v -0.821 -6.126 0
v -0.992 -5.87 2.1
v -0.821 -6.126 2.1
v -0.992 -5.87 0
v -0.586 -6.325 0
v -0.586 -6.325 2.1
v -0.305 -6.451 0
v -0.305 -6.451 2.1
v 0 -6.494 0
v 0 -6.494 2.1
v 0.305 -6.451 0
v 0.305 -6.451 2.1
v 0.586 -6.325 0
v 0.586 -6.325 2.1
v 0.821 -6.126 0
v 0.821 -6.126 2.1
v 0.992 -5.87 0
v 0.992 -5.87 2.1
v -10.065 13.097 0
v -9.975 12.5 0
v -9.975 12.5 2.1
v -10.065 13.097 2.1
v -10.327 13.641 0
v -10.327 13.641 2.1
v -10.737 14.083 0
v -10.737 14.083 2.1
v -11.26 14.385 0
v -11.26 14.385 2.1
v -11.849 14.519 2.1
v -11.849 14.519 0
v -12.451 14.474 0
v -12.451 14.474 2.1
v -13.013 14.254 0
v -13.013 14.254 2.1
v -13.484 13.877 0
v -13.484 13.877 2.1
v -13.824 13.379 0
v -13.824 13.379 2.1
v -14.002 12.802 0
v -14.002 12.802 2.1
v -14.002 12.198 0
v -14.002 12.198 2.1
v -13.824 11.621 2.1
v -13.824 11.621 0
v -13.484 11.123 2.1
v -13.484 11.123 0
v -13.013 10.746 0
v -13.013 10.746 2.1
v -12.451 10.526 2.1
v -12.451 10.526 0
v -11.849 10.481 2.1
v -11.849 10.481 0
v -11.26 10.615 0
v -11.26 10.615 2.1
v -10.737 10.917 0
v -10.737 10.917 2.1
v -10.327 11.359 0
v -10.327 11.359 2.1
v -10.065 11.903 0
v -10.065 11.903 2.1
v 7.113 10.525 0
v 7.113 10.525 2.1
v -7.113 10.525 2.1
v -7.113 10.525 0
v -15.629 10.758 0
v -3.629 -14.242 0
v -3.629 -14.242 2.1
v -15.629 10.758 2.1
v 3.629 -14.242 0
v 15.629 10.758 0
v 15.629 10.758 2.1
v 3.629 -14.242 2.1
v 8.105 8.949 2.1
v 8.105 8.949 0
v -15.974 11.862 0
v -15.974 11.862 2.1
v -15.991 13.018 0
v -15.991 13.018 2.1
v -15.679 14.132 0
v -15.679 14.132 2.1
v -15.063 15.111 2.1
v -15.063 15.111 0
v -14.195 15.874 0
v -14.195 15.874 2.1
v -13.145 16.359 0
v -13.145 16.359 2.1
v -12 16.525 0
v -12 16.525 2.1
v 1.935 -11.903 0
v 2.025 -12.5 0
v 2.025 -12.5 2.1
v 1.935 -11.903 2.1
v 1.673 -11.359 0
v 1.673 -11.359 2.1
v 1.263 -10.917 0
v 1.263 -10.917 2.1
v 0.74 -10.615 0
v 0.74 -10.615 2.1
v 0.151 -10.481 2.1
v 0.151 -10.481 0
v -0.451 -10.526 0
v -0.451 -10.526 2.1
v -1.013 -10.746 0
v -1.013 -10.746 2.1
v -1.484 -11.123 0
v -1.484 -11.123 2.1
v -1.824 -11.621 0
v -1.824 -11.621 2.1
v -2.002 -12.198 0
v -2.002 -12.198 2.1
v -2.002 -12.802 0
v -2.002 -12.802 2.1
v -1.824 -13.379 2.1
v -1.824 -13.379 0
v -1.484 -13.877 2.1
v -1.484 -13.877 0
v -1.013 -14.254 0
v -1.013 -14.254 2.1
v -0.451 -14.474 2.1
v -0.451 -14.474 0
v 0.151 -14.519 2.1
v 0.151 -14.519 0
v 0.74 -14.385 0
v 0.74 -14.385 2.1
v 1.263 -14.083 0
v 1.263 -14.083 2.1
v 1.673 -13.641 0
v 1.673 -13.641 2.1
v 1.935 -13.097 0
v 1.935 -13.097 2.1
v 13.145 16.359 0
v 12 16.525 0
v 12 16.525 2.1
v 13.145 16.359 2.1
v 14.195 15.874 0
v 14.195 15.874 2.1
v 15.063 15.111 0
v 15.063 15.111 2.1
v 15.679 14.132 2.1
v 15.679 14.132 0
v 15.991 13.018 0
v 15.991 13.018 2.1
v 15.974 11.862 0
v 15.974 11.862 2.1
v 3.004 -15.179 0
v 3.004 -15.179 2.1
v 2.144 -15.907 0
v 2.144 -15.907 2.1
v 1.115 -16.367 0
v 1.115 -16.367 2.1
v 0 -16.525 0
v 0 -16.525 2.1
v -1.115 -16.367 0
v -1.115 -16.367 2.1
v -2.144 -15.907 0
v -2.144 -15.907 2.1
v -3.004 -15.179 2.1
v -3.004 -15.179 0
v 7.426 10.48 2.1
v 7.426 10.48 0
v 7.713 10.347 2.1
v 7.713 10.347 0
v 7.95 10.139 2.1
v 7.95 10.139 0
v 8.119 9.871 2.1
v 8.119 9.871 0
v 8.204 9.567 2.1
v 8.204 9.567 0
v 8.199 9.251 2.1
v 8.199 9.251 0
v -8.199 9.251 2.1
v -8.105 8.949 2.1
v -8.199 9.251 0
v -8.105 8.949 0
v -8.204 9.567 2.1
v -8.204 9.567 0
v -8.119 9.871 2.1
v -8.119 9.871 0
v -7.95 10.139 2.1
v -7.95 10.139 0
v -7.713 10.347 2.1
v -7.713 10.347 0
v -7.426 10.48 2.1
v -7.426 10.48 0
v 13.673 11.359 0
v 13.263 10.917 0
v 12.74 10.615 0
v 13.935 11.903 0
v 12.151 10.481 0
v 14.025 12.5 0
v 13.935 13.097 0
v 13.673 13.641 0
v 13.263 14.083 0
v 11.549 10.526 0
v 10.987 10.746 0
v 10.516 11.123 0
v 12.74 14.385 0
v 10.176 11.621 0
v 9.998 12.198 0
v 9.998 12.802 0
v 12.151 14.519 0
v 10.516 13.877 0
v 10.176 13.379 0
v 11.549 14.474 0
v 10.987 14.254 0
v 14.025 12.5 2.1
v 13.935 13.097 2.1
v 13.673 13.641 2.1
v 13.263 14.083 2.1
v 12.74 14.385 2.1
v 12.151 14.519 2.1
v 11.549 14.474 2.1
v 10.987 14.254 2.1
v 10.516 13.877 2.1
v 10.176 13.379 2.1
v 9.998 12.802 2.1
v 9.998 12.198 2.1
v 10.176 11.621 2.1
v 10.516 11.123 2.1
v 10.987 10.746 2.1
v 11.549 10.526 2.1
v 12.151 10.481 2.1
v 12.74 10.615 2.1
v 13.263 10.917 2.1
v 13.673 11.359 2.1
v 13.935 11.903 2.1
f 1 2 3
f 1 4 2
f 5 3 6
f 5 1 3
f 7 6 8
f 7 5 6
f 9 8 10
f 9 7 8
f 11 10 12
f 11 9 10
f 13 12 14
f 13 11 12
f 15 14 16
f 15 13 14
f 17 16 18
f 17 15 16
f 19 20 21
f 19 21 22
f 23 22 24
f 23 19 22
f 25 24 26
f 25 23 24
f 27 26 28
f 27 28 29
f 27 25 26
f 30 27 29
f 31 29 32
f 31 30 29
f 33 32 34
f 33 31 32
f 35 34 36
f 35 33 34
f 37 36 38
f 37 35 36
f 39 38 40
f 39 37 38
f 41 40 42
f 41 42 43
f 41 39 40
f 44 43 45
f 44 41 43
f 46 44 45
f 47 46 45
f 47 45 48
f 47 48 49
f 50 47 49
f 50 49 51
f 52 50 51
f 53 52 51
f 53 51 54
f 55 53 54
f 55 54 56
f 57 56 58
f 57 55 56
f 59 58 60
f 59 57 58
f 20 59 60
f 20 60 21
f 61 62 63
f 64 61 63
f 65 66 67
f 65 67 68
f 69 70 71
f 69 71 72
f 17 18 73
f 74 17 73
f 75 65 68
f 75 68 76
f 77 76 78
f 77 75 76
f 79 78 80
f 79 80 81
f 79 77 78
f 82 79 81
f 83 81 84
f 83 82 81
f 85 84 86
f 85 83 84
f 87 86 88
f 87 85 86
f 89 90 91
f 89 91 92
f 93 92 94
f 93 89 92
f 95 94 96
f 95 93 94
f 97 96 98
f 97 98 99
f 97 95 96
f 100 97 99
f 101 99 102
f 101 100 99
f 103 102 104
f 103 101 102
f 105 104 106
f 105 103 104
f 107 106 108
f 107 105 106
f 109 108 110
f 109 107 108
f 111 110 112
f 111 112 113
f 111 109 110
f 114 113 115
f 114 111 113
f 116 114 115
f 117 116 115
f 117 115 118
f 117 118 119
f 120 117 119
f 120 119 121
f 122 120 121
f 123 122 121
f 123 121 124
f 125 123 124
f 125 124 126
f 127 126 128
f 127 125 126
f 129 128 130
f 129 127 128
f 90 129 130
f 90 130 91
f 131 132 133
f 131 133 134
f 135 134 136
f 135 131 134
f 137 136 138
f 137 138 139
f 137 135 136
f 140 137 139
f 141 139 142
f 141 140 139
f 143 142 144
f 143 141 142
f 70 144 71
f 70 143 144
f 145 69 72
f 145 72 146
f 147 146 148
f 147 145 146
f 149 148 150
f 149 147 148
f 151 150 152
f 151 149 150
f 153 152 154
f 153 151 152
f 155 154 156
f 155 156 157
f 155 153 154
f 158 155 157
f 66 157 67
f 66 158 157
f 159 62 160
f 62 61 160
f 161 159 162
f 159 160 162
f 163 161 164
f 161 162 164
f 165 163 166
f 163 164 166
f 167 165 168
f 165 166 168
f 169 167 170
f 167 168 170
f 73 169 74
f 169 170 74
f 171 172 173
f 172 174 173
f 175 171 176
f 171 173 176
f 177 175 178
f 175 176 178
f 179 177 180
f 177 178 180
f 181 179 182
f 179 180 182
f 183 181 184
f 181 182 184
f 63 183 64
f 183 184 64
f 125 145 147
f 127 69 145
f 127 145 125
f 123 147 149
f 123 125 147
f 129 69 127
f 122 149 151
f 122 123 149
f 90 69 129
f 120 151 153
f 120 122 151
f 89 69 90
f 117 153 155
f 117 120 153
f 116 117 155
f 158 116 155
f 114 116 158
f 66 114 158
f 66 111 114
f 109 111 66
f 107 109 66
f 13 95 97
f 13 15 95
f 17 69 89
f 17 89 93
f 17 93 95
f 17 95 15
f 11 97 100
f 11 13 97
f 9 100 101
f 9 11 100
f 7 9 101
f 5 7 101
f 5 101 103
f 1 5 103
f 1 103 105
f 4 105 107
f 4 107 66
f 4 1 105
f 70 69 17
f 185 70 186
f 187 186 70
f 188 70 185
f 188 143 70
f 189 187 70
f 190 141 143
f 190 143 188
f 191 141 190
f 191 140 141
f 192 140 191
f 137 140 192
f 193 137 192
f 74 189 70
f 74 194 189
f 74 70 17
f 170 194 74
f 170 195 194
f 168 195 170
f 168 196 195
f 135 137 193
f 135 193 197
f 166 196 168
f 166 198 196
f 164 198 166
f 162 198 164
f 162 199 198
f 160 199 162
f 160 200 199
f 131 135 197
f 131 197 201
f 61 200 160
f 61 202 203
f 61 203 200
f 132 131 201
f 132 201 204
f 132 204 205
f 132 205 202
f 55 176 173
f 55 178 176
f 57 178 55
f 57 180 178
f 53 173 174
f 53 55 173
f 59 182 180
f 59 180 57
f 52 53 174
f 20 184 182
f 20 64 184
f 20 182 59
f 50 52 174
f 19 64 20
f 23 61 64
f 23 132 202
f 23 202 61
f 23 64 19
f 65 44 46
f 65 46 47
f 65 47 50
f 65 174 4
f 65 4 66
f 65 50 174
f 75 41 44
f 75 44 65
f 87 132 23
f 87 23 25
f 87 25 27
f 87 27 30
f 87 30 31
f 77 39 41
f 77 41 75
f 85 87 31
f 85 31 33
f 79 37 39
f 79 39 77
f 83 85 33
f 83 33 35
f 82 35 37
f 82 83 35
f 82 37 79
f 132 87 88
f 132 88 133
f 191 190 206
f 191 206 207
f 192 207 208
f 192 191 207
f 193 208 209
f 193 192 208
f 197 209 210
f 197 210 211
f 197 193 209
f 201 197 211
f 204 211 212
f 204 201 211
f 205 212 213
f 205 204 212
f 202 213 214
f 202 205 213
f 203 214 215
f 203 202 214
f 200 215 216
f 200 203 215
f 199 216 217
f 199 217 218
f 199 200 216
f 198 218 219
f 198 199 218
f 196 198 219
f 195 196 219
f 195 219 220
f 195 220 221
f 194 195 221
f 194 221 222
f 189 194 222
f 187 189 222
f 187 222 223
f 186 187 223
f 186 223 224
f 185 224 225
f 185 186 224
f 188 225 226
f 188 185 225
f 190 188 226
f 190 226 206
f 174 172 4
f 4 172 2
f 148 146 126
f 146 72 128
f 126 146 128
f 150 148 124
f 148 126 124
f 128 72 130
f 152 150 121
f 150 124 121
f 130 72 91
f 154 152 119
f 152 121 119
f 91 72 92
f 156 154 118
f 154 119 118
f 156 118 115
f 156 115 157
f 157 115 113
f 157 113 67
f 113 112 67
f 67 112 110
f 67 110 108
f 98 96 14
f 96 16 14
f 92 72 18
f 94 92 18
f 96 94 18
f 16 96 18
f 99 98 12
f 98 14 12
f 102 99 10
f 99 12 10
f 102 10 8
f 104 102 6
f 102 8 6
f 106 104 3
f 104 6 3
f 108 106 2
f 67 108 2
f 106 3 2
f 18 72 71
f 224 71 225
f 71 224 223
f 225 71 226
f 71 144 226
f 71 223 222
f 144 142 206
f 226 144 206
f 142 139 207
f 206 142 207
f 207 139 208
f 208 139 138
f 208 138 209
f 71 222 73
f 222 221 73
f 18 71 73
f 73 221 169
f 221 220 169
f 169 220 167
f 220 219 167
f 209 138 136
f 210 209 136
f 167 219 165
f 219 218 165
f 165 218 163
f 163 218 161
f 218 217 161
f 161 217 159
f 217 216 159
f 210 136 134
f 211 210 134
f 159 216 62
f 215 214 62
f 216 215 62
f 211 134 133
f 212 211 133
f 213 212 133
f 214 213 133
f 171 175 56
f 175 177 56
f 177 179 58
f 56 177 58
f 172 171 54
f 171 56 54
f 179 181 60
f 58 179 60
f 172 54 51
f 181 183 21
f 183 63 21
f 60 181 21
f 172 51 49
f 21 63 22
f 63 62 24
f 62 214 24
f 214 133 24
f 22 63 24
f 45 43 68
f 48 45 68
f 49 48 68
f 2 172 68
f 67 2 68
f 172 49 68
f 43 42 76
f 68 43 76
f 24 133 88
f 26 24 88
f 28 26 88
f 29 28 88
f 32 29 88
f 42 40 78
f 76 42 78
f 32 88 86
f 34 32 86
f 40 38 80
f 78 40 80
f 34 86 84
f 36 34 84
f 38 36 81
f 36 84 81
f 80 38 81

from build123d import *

# Parameters (mm, degrees)
SKETCH_1_R          = 2.025
EXTRUDE_1_DEPTH     = 2.1
CUT_EXTRUDE_1_DEPTH = 21.1
FILLET_1_R          = 1.1


with BuildPart() as part:
    # 草图1 → 凸台-拉伸1 (new body)
    with BuildSketch(Plane.XY):
        with BuildLine():
            Line((-12, 16.525), (12, 16.525))
            ThreePointArc((12, 16.525), (15.406694788, 14.643608085), (15.628630306, 10.758257453))
            Line((15.628630306, 10.758257453), (3.628630306, -14.241742547))
            ThreePointArc((3.628630306, -14.241742547), (0, -16.525), (-3.628630306, -14.241742547))
            Line((-3.628630306, -14.241742547), (-15.628630306, 10.758257453))
            ThreePointArc((-15.628630306, 10.758257453), (-15.406694788, 14.643608085), (-12, 16.525))
        make_face()
        with Locations((-12, 12.5)):
            Circle(SKETCH_1_R, mode=Mode.SUBTRACT)
        with Locations((12, 12.5)):
            Circle(SKETCH_1_R, mode=Mode.SUBTRACT)
        with Locations((0, -12.5)):
            Circle(SKETCH_1_R, mode=Mode.SUBTRACT)
    extrude(amount=EXTRUDE_1_DEPTH)

    # 草图2 → 切除-拉伸1 (cut)
    with BuildSketch(Plane.XY.offset(2.1)):
        Polygon((-8.861262909, 10.525), (0, -7.935964395), (8.861262909, 10.525), align=None)
    extrude(amount=-CUT_EXTRUDE_1_DEPTH, mode=Mode.SUBTRACT)

    # 圆角1
    fillet_1_edges = [part.edges().sort_by_distance(p)[0] for p in [
        (-8.861262909, 10.525, 1.05),
        (8.861262909, 10.525, 1.05),
        (0, -7.935964395, 1.05),
    ]]
    fillet(fillet_1_edges, radius=FILLET_1_R)


solid = part.part
